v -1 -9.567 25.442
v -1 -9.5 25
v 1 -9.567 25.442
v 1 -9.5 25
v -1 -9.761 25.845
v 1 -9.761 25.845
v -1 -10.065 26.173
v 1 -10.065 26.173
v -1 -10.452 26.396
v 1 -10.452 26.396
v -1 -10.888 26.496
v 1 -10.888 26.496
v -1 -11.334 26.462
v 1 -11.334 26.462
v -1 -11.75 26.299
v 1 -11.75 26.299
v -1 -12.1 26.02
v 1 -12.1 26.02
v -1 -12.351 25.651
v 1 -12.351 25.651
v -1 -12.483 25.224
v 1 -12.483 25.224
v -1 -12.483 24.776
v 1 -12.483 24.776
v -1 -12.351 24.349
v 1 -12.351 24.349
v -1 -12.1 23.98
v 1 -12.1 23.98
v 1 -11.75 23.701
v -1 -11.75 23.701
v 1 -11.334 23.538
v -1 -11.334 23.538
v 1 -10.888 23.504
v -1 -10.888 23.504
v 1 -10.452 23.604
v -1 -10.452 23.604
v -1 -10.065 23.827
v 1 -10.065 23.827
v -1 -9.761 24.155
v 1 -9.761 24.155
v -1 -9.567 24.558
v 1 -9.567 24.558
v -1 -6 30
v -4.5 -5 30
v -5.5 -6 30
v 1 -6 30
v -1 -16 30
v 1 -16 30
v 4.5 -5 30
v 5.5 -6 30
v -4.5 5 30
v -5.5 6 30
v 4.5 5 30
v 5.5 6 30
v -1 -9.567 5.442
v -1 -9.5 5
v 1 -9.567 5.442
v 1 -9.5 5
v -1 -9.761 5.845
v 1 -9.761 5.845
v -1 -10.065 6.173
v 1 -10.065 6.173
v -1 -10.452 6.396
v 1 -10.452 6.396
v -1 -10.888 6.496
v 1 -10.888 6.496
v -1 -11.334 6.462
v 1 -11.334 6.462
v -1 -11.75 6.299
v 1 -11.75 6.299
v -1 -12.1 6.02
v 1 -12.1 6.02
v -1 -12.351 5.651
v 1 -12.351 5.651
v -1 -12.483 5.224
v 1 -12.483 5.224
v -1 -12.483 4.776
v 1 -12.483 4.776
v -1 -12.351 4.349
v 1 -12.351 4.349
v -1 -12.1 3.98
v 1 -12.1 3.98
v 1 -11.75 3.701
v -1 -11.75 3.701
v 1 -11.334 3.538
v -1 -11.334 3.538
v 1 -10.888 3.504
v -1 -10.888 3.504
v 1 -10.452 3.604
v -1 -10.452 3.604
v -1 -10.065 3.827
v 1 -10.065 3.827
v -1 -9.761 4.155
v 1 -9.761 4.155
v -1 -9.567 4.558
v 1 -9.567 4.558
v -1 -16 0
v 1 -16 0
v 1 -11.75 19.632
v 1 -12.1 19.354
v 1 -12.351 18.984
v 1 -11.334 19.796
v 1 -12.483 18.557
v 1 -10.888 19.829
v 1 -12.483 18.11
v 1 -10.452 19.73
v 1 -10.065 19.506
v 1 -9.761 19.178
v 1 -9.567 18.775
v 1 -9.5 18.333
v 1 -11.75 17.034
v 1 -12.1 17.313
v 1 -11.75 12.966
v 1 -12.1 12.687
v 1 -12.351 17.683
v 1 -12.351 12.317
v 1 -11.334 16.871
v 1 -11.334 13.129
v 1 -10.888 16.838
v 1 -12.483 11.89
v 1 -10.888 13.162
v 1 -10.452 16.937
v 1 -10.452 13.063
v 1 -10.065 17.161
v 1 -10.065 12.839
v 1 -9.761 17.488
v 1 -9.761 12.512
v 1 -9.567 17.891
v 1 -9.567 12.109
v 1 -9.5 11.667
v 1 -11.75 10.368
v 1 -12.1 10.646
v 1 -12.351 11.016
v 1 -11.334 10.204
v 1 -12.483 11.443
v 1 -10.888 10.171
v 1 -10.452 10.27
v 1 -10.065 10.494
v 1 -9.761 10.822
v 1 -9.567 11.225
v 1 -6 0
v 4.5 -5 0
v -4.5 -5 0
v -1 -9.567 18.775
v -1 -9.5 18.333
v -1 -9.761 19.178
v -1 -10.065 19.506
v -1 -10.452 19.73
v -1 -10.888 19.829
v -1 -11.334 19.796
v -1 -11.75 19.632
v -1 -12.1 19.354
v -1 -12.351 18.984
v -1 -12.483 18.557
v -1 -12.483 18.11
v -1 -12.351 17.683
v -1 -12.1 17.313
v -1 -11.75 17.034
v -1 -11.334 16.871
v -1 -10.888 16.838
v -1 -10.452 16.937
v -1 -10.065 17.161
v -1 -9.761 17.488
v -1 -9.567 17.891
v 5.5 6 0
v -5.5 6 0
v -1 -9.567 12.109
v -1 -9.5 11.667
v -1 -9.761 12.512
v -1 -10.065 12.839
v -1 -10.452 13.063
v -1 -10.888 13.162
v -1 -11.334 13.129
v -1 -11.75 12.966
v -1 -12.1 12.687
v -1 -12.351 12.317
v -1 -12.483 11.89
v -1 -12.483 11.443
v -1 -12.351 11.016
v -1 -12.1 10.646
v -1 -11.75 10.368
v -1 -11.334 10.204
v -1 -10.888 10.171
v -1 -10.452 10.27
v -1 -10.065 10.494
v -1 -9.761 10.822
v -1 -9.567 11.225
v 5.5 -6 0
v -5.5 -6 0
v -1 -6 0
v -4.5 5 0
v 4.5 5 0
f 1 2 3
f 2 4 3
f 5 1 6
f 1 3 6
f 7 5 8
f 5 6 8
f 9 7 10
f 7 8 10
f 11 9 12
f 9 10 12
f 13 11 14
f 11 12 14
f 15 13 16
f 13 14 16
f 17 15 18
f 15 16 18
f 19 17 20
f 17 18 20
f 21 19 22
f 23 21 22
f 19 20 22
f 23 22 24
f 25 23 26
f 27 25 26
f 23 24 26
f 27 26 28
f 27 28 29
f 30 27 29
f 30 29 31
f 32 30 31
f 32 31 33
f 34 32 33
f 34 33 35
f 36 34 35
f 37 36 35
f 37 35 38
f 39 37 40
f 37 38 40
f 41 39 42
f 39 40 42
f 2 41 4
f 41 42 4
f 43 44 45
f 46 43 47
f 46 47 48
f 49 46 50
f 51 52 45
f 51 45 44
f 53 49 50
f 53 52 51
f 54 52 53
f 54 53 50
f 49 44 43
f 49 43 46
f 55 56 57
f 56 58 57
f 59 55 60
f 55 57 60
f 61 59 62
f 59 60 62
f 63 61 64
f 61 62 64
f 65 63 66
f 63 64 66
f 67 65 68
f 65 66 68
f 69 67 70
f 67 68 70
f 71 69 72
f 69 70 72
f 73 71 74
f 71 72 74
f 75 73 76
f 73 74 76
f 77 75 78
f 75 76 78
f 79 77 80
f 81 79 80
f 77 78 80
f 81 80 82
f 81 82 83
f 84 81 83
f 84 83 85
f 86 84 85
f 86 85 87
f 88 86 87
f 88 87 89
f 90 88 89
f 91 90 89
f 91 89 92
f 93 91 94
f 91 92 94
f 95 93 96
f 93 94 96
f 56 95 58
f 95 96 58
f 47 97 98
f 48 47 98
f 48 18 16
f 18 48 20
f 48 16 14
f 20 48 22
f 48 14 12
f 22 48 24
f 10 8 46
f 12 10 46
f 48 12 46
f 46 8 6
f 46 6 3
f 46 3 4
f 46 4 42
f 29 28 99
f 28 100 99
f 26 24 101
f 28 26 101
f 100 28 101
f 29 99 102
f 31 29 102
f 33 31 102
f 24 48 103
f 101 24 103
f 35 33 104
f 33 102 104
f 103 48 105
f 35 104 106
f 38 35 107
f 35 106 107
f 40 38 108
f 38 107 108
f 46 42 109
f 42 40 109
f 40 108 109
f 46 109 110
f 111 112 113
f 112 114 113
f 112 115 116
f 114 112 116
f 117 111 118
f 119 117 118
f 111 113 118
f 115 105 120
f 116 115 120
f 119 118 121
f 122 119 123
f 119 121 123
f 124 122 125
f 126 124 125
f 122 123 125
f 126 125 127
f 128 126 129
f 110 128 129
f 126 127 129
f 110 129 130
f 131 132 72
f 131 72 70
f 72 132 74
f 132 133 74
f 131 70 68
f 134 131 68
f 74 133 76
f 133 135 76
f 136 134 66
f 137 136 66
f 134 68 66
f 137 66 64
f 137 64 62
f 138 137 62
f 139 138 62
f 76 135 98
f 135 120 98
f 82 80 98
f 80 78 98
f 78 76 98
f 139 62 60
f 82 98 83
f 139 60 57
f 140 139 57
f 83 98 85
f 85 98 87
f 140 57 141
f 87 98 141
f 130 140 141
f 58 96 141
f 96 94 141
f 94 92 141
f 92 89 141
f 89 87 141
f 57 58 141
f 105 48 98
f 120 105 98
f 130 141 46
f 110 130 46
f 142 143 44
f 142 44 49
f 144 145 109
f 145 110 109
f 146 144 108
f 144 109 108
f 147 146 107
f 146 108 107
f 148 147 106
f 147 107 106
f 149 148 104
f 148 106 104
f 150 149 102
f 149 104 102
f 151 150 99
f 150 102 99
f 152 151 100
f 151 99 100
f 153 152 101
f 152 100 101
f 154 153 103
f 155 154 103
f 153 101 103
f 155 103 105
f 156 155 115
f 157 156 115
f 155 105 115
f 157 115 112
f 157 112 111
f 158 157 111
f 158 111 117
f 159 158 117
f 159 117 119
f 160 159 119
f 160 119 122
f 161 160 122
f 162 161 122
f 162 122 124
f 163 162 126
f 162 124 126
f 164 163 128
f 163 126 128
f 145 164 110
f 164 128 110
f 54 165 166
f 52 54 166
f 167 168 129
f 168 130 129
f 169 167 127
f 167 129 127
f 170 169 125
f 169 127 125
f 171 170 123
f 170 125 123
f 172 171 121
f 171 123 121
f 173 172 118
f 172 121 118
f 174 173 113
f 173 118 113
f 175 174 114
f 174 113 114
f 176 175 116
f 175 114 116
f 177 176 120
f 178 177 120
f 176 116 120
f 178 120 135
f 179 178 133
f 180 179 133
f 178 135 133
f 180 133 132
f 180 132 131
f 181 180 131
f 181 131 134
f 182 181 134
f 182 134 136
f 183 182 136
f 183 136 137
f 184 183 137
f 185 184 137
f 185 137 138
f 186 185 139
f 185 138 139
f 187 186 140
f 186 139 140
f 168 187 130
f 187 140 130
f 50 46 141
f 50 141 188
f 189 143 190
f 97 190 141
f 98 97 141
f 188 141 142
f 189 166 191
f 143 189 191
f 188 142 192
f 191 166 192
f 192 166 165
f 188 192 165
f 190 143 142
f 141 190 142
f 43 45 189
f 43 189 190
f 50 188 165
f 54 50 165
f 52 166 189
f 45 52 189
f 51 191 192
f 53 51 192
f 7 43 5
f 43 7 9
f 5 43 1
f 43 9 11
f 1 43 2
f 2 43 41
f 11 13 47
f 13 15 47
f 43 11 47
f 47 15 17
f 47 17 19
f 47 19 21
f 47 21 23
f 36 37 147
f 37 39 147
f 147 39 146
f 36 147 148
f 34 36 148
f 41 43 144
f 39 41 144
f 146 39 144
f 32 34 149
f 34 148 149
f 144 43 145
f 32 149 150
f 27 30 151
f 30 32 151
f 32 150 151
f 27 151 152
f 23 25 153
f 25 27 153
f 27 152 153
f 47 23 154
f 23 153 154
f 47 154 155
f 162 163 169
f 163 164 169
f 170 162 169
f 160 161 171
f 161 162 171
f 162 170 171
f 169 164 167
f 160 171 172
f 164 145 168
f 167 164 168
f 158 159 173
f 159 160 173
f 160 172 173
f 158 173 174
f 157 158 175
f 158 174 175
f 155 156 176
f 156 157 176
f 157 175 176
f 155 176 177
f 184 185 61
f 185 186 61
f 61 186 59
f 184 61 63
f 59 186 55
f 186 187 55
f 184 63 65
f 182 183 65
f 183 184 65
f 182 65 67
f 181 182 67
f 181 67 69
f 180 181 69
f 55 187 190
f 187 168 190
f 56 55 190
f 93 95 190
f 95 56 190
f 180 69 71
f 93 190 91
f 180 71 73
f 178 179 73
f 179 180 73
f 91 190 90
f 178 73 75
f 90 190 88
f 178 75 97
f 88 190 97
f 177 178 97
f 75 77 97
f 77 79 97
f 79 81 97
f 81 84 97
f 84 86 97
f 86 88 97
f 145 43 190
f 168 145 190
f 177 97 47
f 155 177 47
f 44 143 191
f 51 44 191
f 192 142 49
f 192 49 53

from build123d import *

# Parameters (mm, degrees)
SKETCH_W            = 9
SKETCH_H            = 10
PAD_DEPTH           = 30
SKETCH001_R         = 1.5
POCKET_DEPTH        = 5.501
POCKET_DEPTH_BACK   = 5.501
LINEARPATTERN_COUNT = 4
LINEARPATTERN_PITCH = 6.666667


with BuildPart() as part:
    # Sketch → Pad (new body)
    with BuildSketch(Plane.XY):
        Polygon((-5.5, 6), (-5.5, -6), (-1, -6), (-1, -16), (1, -16), (1, -6), (5.5, -6), (5.5, 6), align=None)
        Rectangle(SKETCH_W, SKETCH_H, mode=Mode.SUBTRACT)
    extrude(amount=PAD_DEPTH)

    # Sketch001 → Pocket (cut, two sides)
    with BuildSketch(Plane.YZ) as pocket_sk:
        with Locations((-11, 5)):
            Circle(SKETCH001_R)
    pocket = extrude(amount=-POCKET_DEPTH, mode=Mode.SUBTRACT) + extrude(pocket_sk.sketch, amount=POCKET_DEPTH_BACK, mode=Mode.SUBTRACT)

    # LinearPattern: Pocket ×4
    with Locations(*[(0, 0, i * LINEARPATTERN_PITCH) for i in range(1, LINEARPATTERN_COUNT)]):
        add(pocket, mode=Mode.SUBTRACT)


solid = part.part
